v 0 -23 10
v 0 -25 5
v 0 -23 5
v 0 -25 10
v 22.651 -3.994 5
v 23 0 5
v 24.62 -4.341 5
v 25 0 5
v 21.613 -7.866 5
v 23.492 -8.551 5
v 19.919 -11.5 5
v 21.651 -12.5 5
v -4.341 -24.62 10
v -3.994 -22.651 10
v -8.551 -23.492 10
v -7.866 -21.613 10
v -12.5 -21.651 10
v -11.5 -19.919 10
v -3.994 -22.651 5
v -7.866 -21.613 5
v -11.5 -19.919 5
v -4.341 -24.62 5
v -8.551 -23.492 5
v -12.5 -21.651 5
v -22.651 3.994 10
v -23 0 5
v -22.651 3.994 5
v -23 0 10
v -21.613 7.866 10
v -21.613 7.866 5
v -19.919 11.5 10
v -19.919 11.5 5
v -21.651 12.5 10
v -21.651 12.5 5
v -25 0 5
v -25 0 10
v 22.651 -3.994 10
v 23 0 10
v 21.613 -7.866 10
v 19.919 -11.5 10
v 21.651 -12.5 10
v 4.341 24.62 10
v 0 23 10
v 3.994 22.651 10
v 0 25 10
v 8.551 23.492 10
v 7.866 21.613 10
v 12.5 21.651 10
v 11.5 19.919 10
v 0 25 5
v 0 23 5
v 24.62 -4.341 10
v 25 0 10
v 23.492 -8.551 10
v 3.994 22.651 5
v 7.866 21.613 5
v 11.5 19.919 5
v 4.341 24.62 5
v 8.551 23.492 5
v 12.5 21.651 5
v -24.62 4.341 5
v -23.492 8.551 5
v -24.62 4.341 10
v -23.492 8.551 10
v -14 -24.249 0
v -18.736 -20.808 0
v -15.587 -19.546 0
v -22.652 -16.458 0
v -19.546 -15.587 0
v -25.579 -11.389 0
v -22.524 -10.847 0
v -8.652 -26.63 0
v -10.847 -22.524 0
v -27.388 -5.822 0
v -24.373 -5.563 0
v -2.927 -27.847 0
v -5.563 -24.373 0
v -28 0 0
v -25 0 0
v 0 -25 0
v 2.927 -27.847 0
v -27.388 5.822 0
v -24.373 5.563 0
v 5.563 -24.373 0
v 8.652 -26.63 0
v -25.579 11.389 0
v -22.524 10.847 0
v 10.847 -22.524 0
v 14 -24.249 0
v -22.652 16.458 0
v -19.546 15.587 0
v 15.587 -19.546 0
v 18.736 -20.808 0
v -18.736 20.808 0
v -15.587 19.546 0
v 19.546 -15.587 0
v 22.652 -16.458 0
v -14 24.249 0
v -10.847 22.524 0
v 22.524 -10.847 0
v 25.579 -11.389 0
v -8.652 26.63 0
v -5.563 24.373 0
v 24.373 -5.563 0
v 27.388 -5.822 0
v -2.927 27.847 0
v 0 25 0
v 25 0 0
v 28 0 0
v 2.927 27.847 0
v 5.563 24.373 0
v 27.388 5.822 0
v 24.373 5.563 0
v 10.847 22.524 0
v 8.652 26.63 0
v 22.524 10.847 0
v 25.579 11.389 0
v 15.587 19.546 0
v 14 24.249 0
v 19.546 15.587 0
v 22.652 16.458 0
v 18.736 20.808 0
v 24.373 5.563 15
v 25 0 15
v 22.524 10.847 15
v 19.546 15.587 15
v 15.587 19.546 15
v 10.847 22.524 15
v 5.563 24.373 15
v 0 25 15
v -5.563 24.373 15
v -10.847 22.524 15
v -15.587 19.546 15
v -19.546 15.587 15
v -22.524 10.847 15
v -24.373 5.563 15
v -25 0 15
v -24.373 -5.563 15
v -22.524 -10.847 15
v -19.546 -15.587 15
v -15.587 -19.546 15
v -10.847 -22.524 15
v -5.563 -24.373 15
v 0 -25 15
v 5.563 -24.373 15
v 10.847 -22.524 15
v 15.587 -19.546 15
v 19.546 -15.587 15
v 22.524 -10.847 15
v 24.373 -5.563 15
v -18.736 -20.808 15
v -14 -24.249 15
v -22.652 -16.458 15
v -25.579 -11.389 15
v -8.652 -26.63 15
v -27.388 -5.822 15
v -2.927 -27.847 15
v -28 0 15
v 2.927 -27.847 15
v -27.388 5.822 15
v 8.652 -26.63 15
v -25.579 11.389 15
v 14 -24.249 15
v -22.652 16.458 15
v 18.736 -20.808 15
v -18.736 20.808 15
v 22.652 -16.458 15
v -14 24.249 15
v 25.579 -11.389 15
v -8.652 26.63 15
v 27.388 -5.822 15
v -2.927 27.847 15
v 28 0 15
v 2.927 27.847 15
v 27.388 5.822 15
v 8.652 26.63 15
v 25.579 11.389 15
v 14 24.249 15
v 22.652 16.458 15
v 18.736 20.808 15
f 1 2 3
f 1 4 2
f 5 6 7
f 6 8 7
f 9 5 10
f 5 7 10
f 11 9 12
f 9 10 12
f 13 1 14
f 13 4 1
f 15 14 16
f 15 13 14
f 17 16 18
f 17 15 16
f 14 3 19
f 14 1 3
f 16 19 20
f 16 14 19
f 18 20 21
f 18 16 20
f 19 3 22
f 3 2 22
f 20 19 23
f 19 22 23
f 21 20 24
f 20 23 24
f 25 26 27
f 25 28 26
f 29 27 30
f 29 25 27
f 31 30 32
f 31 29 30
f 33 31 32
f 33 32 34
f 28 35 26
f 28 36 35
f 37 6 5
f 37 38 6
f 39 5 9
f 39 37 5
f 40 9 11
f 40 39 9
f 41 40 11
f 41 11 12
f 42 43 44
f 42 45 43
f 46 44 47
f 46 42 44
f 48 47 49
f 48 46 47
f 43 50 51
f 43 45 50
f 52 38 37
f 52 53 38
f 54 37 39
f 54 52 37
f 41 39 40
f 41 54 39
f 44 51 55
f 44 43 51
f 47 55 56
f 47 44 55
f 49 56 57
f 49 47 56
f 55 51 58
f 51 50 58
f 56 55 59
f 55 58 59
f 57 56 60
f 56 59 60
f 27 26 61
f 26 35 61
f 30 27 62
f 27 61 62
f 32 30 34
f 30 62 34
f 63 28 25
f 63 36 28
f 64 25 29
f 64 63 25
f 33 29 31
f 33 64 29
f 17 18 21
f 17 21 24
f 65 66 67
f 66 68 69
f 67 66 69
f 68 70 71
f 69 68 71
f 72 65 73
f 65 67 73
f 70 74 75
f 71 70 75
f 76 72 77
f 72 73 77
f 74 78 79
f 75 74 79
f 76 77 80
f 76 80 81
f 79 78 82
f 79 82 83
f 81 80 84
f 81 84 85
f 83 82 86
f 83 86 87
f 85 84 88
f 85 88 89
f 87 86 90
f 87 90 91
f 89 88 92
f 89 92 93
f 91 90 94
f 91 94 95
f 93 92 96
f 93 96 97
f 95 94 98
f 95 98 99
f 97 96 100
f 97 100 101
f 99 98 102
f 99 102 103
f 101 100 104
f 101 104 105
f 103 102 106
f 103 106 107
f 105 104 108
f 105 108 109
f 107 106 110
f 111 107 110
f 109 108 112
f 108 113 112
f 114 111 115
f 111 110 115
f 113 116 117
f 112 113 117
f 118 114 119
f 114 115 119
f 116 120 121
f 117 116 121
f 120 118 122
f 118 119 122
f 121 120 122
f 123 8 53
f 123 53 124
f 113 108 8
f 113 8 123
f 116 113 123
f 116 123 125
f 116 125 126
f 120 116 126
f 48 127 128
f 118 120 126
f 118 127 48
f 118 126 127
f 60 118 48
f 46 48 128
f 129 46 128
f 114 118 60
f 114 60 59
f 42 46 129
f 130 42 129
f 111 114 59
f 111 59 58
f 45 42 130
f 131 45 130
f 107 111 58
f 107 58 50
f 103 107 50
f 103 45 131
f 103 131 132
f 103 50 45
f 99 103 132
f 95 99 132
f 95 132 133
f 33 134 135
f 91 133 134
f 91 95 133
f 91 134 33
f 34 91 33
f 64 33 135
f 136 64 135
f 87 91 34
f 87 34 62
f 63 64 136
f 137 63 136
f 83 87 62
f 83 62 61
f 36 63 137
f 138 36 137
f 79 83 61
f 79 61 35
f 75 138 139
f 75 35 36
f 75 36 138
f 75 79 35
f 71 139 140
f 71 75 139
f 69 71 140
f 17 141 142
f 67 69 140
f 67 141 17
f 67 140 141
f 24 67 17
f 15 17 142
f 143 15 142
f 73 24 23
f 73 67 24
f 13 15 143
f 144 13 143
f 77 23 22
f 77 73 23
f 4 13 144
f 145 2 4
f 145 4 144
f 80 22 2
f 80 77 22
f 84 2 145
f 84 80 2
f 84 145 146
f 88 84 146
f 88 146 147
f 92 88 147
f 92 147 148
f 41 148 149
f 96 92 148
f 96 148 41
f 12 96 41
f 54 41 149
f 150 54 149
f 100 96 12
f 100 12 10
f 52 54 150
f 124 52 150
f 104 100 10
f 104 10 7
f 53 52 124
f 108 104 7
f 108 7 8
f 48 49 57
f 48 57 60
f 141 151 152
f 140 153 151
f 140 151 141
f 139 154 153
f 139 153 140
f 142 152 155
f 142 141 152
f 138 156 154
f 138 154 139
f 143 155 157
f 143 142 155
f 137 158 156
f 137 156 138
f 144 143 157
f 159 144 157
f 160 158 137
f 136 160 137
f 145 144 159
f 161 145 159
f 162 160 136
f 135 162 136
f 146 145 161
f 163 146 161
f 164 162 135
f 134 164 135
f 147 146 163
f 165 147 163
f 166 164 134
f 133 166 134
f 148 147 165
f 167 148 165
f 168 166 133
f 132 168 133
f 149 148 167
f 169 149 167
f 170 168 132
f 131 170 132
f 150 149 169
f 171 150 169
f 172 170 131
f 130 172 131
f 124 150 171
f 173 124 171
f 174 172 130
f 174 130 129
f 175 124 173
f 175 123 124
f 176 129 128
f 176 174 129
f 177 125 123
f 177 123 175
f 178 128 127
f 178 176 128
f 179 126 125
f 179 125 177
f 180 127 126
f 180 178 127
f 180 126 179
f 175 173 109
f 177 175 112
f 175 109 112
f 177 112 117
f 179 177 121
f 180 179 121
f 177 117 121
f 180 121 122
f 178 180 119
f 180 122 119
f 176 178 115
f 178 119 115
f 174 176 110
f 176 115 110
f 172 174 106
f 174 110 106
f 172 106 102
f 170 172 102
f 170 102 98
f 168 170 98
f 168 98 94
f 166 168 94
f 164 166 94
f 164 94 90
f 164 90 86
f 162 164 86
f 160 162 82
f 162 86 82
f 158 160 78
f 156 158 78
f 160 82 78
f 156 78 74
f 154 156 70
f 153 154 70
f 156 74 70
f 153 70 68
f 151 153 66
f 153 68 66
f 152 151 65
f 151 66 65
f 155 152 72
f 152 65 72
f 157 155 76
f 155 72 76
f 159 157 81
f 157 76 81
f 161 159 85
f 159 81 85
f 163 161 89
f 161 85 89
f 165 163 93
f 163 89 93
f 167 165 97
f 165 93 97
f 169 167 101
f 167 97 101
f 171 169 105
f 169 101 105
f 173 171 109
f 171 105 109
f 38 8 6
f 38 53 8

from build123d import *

# Parameters (mm, degrees)
F0_R            = 28
F0_R_2          = 25
F1_DEPTH        = 15
F4_DEPTH        = 2.5
F4_COPIES_COUNT = 4


# Not quite as in the source:
# - a pattern or mirror of a feature is missing from the dataset's text; its kind, count and spacing are read off the source's solid


with BuildPart() as f1:
    # F0 (on Top) → F1 (new body)
    with BuildSketch(Plane.XY):
        Circle(F0_R)
        Circle(F0_R_2, mode=Mode.SUBTRACT)
    extrude(amount=F1_DEPTH)

    # F3 (on offset) → F4 (join, symmetric)
    with BuildSketch(Plane.XY.offset(7.5)):
        with BuildLine():
            ThreePointArc((0, 23), (5.9528380374, 22.2162940046), (11.5, 19.918584287))
            Line((11.5, 19.918584287), (12.5, 21.6506350946))
            ThreePointArc((12.5, 21.6506350946), (6.4704761276, 24.1481456572), (0, 25))
            Line((0, 25), (0, 23))
        make_face()
    f4 = extrude(amount=F4_DEPTH, both=True)

    # F4_copies: F4 ×4 about axis
    f4_copies_axis = Axis((0, 0, 0), (0, 0, 1))
    for i in range(1, F4_COPIES_COUNT):
        add(f4.rotate(f4_copies_axis, i * 360 / F4_COPIES_COUNT))


solid = f1.part
